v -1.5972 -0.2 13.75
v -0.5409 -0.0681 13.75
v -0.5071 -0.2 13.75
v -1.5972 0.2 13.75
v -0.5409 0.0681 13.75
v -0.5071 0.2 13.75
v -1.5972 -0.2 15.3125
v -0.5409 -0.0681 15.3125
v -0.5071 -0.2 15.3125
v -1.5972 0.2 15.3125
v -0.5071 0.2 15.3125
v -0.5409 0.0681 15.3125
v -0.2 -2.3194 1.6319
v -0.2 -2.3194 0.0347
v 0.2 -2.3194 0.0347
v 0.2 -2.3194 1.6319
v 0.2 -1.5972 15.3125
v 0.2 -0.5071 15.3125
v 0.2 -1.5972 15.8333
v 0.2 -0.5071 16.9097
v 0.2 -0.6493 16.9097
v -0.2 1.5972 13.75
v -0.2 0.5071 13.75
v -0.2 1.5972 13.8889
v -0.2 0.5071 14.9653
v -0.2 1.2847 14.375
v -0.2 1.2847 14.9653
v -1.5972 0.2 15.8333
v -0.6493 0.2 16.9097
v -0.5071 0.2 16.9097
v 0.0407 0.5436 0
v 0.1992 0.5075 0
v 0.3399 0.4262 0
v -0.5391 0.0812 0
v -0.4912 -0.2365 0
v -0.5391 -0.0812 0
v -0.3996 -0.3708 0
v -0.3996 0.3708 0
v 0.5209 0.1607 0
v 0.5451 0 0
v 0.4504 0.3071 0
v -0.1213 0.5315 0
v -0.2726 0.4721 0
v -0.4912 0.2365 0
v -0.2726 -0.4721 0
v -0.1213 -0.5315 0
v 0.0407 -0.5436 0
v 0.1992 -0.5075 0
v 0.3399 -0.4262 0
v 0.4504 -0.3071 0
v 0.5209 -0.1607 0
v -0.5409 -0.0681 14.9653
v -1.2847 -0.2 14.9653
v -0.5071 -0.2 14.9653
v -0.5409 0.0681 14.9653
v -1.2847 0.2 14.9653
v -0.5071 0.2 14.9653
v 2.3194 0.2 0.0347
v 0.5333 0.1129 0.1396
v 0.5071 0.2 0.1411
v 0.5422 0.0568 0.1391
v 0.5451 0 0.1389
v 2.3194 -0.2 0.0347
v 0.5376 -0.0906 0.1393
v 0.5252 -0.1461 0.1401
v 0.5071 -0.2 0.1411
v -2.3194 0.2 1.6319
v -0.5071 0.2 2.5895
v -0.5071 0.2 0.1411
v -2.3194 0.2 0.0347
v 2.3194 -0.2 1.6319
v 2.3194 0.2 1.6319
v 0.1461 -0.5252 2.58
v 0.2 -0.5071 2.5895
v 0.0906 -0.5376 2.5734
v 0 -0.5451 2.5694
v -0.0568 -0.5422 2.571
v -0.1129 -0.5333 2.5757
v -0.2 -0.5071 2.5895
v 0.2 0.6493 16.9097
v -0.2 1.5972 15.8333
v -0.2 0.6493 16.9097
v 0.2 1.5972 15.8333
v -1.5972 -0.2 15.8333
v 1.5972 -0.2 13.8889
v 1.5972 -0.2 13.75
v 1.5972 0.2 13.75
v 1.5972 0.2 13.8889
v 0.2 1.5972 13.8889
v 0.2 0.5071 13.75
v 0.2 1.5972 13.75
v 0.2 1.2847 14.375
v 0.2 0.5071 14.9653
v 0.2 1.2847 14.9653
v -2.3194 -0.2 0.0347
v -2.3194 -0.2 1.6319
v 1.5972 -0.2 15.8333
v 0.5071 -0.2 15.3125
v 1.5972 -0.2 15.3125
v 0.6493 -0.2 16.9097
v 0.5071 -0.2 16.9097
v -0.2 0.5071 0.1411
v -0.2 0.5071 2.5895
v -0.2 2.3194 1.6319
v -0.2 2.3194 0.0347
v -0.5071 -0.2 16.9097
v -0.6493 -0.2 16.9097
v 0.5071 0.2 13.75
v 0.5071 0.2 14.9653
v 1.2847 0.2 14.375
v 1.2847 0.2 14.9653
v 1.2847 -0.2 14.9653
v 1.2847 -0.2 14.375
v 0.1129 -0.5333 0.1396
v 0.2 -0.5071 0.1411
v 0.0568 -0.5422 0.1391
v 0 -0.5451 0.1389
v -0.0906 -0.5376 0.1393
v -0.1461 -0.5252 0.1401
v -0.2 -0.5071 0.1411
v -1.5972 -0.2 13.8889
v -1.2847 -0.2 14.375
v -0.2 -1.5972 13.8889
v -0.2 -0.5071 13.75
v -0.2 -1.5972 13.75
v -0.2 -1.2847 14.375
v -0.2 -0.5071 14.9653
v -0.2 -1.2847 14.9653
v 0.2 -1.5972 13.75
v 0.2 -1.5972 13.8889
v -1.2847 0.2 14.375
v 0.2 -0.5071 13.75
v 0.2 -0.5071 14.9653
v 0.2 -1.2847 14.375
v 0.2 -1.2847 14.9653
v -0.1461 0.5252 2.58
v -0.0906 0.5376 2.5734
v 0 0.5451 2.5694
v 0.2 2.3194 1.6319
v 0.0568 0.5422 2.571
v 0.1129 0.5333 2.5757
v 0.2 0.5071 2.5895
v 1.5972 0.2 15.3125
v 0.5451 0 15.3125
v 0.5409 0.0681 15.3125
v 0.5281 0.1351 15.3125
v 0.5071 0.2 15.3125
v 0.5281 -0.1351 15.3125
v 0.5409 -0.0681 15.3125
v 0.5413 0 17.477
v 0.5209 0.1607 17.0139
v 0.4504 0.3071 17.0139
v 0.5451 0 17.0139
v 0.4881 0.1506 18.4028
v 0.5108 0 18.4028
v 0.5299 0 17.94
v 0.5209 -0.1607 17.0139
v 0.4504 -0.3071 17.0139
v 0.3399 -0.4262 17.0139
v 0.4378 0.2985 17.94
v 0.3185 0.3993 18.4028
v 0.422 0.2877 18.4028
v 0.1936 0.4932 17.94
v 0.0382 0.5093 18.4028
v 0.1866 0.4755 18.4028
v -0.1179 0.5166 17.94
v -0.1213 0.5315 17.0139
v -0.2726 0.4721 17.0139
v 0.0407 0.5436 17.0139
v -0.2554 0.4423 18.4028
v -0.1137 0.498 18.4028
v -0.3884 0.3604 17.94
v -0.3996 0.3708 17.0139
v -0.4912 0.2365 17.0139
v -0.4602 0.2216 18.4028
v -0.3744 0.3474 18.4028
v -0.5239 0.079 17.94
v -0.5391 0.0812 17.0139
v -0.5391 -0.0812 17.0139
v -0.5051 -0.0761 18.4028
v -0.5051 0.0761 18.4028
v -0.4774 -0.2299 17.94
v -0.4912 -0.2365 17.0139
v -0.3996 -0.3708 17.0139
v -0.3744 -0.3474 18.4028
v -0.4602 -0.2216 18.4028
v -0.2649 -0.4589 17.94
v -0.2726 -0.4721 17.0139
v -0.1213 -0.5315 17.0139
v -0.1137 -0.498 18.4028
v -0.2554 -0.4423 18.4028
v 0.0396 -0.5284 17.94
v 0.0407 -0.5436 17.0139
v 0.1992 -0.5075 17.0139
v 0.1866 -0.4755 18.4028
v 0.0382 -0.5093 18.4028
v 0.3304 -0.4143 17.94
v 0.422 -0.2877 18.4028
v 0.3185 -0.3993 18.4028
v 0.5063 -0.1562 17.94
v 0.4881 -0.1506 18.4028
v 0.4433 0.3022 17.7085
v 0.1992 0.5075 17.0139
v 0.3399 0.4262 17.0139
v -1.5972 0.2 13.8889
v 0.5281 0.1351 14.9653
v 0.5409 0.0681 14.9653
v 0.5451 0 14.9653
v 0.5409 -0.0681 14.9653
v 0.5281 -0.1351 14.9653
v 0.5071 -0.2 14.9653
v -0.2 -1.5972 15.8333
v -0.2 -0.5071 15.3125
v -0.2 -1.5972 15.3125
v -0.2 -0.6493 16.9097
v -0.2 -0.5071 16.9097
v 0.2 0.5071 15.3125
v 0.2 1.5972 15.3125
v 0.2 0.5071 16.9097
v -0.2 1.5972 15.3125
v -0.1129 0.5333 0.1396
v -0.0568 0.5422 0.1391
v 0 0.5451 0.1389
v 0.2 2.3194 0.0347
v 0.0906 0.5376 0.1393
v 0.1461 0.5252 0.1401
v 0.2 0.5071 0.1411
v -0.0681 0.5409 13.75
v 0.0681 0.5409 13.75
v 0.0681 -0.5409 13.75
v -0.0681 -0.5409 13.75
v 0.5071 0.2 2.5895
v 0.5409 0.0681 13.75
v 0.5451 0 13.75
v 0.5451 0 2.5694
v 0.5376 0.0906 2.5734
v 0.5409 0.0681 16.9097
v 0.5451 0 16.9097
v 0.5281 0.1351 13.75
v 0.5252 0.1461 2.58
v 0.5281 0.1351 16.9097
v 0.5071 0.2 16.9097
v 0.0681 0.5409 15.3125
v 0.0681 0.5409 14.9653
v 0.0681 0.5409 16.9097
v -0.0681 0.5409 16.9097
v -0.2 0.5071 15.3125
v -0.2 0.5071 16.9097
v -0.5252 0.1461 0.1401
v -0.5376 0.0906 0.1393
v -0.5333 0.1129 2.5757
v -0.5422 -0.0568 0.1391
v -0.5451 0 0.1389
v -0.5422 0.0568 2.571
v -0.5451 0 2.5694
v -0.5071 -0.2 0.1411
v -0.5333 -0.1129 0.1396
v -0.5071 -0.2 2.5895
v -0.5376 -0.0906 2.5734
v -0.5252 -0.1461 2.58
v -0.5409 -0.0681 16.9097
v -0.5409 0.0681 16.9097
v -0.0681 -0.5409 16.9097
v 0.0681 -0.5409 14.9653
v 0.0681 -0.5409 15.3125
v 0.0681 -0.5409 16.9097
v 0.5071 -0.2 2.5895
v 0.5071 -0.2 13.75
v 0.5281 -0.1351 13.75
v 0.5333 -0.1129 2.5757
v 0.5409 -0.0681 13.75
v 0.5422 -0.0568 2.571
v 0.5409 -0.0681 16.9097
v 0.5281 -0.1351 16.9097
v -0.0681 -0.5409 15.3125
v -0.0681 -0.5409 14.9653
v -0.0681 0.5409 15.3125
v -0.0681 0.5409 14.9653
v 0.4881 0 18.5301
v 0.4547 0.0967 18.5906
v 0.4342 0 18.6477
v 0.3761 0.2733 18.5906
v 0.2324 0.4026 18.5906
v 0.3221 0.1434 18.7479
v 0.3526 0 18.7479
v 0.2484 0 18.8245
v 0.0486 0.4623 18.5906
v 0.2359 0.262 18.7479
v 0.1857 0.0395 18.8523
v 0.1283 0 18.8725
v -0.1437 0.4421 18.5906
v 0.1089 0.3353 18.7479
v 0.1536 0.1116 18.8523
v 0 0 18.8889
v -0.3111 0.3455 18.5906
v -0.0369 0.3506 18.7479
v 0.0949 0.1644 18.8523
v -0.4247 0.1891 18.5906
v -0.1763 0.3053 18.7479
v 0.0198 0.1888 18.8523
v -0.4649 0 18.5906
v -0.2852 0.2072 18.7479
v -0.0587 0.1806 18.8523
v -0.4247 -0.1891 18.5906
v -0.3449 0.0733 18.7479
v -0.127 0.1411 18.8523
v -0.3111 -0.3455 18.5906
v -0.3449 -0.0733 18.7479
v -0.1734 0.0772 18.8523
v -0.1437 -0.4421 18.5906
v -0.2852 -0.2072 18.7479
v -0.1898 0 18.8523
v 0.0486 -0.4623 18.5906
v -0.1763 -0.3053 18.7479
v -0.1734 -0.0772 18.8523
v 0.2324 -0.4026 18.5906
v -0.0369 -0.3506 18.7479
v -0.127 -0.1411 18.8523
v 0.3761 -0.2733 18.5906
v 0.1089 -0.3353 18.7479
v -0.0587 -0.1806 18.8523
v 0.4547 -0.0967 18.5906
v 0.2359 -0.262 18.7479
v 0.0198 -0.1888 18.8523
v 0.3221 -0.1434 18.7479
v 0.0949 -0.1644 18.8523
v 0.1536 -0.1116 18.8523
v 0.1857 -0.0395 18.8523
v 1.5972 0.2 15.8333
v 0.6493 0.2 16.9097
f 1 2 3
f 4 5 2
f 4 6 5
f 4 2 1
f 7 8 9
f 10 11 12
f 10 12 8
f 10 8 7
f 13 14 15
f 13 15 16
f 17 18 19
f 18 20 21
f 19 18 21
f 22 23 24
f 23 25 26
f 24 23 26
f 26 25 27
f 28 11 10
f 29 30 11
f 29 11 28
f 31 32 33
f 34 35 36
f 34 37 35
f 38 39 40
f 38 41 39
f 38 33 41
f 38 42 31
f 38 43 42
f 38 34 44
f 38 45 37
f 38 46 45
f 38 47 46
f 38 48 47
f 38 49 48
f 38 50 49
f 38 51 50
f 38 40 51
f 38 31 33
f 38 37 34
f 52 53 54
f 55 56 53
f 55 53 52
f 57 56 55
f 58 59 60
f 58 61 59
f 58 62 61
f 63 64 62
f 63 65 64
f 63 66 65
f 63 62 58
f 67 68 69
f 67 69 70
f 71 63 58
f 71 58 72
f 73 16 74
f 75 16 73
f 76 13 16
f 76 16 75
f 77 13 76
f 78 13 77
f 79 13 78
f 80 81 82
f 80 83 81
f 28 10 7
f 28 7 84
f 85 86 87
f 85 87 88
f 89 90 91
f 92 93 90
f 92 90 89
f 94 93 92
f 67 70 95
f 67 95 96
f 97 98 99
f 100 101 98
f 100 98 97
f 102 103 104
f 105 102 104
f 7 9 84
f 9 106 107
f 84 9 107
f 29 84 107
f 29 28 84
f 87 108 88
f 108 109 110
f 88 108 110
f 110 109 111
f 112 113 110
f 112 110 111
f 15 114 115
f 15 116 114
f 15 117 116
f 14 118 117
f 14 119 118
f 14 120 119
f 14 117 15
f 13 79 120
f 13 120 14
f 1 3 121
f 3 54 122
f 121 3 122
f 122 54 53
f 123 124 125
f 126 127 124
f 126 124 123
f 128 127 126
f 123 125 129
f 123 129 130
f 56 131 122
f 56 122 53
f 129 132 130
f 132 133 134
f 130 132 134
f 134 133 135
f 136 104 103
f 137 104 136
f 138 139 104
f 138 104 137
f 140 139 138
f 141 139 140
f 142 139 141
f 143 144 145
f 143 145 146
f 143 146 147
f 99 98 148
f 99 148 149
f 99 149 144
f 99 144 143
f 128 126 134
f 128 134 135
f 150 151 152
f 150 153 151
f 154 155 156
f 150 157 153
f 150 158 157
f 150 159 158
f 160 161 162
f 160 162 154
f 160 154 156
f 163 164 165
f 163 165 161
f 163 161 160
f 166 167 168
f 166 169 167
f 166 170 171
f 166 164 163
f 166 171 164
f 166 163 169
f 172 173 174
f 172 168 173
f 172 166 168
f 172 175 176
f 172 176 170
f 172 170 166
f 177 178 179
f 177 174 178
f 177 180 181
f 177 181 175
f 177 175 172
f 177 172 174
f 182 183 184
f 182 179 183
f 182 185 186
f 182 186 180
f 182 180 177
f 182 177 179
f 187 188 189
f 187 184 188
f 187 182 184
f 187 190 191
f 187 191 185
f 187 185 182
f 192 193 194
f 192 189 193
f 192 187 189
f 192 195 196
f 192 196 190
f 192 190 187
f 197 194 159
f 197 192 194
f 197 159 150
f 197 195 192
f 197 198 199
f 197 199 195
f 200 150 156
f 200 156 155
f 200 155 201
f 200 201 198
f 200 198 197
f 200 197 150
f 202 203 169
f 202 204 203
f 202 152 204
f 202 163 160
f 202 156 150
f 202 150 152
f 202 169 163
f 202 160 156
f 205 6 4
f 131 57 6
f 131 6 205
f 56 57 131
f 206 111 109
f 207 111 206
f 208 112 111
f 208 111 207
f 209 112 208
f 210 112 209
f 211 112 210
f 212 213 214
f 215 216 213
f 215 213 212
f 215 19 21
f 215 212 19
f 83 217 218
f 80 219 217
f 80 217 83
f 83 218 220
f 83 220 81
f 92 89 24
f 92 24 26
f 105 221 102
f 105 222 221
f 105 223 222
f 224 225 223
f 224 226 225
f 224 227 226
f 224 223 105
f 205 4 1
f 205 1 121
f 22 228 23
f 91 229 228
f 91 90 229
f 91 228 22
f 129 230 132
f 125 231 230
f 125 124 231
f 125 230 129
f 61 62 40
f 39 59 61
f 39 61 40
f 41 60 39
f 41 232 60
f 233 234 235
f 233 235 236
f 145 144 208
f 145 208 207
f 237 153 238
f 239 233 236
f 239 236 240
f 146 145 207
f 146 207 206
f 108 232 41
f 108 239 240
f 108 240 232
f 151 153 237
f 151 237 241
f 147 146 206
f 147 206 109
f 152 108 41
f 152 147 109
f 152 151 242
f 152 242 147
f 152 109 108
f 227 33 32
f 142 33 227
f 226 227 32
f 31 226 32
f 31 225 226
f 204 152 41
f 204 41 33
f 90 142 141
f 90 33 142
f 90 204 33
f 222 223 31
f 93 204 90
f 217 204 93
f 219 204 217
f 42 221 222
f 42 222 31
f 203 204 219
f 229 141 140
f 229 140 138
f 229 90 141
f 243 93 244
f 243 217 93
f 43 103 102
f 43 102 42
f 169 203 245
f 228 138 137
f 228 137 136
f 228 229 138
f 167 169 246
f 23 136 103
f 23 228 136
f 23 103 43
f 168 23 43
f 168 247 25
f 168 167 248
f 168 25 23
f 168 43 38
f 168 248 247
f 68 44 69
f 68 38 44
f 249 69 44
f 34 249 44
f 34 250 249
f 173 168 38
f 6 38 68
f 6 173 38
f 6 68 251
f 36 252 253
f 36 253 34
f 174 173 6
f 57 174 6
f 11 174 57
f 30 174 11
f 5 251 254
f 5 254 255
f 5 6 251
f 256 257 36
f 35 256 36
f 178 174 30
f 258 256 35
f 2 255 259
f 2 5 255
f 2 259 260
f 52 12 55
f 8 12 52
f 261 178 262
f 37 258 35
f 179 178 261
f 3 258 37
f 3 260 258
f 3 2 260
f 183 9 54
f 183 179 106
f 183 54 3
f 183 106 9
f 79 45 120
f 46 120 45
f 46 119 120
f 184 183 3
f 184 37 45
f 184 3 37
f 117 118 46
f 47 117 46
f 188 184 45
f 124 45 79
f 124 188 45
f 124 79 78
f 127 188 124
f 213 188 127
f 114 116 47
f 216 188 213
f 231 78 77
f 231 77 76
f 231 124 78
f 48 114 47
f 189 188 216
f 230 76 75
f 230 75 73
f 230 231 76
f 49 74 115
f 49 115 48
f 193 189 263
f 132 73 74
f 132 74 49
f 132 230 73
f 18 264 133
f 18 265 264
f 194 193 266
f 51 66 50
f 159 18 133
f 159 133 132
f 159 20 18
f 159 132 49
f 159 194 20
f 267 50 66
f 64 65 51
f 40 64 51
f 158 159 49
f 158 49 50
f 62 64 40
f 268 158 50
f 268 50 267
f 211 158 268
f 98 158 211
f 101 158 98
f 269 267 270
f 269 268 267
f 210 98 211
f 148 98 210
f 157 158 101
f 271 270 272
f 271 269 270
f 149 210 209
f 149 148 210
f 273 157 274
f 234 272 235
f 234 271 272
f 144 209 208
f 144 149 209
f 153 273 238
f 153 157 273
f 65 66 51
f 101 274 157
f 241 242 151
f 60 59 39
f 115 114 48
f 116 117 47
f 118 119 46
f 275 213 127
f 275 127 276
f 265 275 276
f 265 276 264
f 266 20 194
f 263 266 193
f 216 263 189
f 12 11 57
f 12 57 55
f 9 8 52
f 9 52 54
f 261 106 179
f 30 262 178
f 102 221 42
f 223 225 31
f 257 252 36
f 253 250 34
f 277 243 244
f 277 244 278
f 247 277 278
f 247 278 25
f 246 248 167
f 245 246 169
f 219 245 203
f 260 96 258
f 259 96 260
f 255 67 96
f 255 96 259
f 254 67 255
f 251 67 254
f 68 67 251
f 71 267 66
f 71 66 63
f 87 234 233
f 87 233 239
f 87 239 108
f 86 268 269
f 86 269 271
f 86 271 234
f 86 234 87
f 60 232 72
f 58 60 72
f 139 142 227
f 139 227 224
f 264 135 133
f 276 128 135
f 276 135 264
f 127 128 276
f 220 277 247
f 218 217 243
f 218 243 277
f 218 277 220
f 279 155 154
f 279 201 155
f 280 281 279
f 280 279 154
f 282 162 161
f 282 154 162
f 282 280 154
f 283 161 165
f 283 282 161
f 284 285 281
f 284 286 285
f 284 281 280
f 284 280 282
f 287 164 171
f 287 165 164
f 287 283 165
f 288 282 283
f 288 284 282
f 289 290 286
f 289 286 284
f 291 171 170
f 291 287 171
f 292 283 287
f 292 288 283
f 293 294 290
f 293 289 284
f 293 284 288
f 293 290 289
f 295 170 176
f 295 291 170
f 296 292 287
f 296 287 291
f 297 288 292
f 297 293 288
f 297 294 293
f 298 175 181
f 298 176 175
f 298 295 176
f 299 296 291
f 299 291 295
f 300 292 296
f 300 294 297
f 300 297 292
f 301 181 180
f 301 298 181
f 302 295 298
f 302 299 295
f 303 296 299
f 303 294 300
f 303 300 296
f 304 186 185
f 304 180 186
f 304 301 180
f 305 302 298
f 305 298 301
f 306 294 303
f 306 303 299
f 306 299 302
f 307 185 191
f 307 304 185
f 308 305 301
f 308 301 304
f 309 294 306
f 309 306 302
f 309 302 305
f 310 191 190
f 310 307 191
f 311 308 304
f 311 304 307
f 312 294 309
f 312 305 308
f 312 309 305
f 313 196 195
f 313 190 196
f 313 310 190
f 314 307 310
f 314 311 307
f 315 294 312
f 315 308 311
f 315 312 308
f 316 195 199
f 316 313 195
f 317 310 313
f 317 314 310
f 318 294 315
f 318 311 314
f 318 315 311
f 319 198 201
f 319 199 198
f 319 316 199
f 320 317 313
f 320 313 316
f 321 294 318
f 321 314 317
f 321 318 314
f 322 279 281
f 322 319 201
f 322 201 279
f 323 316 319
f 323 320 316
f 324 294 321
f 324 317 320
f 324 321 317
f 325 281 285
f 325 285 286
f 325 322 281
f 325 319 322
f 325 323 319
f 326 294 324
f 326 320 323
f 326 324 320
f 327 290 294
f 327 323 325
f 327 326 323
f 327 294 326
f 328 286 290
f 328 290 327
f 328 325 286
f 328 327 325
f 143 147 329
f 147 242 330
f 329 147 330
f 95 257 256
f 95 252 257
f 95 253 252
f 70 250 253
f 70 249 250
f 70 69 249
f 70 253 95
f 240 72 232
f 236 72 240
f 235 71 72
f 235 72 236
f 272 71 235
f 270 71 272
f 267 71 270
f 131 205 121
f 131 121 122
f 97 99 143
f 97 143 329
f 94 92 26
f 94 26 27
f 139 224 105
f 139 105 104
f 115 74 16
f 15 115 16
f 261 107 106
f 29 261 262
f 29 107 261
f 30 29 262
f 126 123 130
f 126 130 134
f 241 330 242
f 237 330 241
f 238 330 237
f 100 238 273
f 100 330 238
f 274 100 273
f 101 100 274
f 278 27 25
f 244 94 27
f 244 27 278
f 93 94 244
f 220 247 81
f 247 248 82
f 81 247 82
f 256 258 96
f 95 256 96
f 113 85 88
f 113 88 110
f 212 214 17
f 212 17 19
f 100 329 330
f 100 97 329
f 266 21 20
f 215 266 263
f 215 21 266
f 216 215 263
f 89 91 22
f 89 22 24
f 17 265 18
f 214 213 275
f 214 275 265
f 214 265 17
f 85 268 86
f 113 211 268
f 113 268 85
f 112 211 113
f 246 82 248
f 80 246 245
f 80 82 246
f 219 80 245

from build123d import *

# Parameters (mm, degrees)
F3_DEPTH = 0.2
F4_COUNT = 4


# Not quite as in the source:
# - a feature names something its author has since deleted; it is built from what else it names


with BuildPart() as f1:
    # F0 (on Front) → F1 (revolve)
    with BuildSketch(Plane.XZ):
        with BuildLine():
            Line((0, 18.8888888889), (0, 0))
            Line((0, 0), (0.5451388889, 0))
            Line((0.5451388889, 0), (0.5451388889, 17.0138888889))
            ThreePointArc((0.5451388889, 17.0138888889), (0.53654676, 17.7085458509), (0.5107756304, 18.4027777778))
            ThreePointArc((0.5107756304, 18.4027777778), (0.3525605469, 18.7479364578), (0, 18.8888888889))
        make_face()
    revolve(axis=Axis((0, 0, 9.4444444444), (0, 0, 1)))

    # F2 (on Front) → F3 (join, symmetric)
    with BuildSketch(Plane.XZ):
        Polygon((0, 16.9097222222), (0, 0.1708931289), (2.3194444444, 0.0347222222), (2.3194444444, 1.6319444444), (0.4, 2.6461323114), (0.4, 13.75), (1.5972222222, 13.75), (1.5972222222, 13.8888888889), (1.2847222222, 14.375), (1.2847222222, 14.9652777778), (0.4, 14.9652777778), (0.4, 15.3125), (1.5972222222, 15.3125), (1.5972222222, 15.8333333333), (0.6493055556, 16.9097222222), align=None)
    extrude(amount=F3_DEPTH, both=True)

    # F4: F1 ×4 about axis
    f4_axis = Axis((0, 0, 0), (0, 0, 1))


with BuildPart() as f1_1:
    add(f1.part)
    for i in range(1, F4_COUNT):
        add(f1.part.rotate(f4_axis, i * 360 / F4_COUNT))


solid = f1_1.part
